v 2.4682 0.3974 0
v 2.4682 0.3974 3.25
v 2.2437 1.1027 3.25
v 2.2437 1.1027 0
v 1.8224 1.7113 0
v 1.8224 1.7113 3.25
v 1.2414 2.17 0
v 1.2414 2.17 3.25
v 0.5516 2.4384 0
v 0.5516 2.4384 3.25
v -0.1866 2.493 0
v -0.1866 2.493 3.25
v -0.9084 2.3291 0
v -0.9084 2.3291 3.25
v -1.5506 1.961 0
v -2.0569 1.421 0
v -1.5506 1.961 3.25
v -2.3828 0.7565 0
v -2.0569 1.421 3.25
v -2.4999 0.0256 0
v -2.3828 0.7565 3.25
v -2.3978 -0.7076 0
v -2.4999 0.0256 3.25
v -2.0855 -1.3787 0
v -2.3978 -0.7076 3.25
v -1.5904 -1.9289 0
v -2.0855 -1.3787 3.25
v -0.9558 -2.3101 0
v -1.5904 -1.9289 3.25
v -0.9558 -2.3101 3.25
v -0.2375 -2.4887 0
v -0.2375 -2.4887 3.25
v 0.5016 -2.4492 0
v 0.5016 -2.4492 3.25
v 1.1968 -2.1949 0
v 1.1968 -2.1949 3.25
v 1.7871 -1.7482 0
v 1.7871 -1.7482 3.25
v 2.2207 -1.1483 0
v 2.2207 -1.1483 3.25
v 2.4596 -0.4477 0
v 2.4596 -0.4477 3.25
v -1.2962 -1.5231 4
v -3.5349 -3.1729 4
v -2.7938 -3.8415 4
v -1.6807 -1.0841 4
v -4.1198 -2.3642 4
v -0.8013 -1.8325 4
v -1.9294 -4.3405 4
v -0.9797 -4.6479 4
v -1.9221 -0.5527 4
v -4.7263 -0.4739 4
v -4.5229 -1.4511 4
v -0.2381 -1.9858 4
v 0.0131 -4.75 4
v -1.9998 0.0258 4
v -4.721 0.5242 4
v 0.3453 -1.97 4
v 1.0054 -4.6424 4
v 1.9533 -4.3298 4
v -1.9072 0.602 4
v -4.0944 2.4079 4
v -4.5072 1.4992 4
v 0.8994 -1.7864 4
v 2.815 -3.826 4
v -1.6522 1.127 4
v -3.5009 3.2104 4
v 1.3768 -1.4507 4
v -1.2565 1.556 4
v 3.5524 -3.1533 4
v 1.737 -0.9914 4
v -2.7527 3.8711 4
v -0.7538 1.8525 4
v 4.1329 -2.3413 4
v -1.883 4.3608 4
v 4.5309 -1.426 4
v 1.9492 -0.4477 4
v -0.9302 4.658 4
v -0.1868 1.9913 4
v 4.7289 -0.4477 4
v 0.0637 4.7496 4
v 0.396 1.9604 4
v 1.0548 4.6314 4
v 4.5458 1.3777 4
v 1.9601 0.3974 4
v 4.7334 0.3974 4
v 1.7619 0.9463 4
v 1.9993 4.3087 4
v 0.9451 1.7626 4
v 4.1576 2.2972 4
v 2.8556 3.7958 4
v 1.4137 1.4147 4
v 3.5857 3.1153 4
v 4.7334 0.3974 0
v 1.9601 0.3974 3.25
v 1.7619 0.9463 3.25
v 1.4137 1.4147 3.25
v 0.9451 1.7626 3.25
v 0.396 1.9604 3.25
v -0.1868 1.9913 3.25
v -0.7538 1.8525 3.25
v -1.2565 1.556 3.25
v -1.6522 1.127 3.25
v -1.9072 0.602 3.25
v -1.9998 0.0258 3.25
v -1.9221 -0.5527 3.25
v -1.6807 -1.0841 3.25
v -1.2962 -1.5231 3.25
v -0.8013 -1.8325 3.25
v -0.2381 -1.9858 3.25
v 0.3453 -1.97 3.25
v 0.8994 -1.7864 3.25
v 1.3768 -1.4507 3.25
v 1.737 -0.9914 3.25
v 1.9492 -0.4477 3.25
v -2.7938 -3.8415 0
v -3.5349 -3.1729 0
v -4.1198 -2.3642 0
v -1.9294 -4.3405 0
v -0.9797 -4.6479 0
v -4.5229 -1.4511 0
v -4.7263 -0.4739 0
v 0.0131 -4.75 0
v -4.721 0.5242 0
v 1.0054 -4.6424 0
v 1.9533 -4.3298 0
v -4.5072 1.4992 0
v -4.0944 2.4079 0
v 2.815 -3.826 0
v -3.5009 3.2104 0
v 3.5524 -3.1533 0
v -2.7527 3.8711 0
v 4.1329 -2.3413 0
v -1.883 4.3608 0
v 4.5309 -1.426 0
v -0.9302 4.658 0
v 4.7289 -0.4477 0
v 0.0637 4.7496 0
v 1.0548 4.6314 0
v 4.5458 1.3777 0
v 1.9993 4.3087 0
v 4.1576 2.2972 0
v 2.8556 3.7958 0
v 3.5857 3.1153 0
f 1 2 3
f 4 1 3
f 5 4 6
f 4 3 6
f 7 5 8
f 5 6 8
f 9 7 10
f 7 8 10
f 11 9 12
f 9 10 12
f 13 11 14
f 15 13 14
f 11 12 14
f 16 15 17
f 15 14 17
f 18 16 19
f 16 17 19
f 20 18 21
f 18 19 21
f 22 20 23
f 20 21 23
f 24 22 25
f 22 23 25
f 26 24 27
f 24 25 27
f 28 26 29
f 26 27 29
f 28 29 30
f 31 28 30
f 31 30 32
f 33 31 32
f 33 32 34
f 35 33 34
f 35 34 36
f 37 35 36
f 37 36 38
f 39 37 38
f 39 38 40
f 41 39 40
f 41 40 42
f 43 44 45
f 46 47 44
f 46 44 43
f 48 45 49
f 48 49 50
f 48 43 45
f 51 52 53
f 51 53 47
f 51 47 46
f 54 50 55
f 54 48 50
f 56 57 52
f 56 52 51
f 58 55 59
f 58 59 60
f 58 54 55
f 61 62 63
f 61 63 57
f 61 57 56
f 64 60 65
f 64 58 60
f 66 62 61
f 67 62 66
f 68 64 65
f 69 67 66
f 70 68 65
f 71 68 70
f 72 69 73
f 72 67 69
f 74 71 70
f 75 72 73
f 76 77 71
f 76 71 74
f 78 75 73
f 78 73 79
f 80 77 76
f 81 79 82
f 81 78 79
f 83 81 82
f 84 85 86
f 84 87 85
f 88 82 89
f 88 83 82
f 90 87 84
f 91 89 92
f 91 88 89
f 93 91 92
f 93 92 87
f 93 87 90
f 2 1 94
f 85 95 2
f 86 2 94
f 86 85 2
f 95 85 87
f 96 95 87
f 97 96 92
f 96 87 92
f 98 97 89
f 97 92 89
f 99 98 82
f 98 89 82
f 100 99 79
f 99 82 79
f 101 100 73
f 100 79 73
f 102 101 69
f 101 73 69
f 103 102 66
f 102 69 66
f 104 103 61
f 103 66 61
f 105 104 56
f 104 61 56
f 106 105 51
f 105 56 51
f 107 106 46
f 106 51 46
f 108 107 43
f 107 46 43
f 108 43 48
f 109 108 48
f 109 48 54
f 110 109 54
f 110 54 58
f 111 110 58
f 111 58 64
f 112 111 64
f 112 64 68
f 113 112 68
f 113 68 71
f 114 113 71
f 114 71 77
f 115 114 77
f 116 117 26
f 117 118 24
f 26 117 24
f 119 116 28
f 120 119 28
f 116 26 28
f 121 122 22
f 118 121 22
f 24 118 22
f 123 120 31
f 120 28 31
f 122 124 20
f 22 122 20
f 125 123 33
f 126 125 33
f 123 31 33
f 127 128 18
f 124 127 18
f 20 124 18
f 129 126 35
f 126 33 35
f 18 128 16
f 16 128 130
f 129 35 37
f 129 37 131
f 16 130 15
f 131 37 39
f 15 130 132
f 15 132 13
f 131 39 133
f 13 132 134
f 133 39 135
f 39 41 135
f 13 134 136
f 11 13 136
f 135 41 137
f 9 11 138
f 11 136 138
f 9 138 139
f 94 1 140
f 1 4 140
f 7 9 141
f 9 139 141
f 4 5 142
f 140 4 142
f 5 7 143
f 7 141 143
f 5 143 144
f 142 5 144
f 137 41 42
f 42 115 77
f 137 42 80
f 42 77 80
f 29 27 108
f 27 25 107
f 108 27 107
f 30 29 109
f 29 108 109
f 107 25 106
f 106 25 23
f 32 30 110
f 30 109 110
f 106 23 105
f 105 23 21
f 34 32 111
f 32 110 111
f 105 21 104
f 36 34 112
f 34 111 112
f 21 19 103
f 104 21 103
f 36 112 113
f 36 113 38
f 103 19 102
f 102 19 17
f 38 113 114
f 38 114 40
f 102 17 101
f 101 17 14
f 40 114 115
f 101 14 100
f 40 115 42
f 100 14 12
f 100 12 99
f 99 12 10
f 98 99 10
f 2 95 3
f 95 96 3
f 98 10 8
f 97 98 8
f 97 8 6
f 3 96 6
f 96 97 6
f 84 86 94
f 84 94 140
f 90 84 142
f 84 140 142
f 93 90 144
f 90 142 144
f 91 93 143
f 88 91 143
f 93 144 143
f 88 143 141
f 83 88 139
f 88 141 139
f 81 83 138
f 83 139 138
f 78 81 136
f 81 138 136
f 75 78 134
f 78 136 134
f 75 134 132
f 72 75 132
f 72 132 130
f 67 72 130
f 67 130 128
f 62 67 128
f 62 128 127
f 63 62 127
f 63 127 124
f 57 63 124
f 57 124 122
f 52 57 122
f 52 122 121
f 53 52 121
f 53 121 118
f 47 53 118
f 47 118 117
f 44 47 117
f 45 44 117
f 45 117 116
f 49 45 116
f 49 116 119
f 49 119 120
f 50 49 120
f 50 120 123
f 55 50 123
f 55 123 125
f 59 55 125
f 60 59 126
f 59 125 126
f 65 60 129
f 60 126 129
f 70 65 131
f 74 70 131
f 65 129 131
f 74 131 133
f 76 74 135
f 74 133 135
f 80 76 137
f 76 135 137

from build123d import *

# Parameters (mm, degrees)
F0_R     = 4.75
F1_DEPTH = 4
F2_R     = 2
F3_DEPTH = 4
F5_START = -0.75
F4_R     = 2.5
F5_DEPTH = 3.25
F6_W     = 3.7872615503
F6_H     = 0.8450912428
F7_DEPTH = 4


with BuildPart() as f1:
    # F0 (on Top) → F1 (new body)
    with BuildSketch(Plane.XY):
        Circle(F0_R)
    extrude(amount=F1_DEPTH)

    # F2 (on face) → F3 (cut)
    with BuildSketch(Plane.XY.offset(4)):
        Circle(F2_R)
    extrude(amount=-F3_DEPTH, mode=Mode.SUBTRACT)

    # F4 (on face) → F5 (cut)
    with BuildSketch(Plane.XY.offset(4).offset(F5_START)):
        Circle(F4_R)
    extrude(amount=-F5_DEPTH, mode=Mode.SUBTRACT)

    # F6 (on face) → F7 (cut)
    with BuildSketch(Plane.XY.offset(4)):
        with Locations((3.3074248931, -0.0251903548)):
            Rectangle(F6_W, F6_H)
    extrude(amount=-F7_DEPTH, mode=Mode.SUBTRACT)


solid = f1.part
